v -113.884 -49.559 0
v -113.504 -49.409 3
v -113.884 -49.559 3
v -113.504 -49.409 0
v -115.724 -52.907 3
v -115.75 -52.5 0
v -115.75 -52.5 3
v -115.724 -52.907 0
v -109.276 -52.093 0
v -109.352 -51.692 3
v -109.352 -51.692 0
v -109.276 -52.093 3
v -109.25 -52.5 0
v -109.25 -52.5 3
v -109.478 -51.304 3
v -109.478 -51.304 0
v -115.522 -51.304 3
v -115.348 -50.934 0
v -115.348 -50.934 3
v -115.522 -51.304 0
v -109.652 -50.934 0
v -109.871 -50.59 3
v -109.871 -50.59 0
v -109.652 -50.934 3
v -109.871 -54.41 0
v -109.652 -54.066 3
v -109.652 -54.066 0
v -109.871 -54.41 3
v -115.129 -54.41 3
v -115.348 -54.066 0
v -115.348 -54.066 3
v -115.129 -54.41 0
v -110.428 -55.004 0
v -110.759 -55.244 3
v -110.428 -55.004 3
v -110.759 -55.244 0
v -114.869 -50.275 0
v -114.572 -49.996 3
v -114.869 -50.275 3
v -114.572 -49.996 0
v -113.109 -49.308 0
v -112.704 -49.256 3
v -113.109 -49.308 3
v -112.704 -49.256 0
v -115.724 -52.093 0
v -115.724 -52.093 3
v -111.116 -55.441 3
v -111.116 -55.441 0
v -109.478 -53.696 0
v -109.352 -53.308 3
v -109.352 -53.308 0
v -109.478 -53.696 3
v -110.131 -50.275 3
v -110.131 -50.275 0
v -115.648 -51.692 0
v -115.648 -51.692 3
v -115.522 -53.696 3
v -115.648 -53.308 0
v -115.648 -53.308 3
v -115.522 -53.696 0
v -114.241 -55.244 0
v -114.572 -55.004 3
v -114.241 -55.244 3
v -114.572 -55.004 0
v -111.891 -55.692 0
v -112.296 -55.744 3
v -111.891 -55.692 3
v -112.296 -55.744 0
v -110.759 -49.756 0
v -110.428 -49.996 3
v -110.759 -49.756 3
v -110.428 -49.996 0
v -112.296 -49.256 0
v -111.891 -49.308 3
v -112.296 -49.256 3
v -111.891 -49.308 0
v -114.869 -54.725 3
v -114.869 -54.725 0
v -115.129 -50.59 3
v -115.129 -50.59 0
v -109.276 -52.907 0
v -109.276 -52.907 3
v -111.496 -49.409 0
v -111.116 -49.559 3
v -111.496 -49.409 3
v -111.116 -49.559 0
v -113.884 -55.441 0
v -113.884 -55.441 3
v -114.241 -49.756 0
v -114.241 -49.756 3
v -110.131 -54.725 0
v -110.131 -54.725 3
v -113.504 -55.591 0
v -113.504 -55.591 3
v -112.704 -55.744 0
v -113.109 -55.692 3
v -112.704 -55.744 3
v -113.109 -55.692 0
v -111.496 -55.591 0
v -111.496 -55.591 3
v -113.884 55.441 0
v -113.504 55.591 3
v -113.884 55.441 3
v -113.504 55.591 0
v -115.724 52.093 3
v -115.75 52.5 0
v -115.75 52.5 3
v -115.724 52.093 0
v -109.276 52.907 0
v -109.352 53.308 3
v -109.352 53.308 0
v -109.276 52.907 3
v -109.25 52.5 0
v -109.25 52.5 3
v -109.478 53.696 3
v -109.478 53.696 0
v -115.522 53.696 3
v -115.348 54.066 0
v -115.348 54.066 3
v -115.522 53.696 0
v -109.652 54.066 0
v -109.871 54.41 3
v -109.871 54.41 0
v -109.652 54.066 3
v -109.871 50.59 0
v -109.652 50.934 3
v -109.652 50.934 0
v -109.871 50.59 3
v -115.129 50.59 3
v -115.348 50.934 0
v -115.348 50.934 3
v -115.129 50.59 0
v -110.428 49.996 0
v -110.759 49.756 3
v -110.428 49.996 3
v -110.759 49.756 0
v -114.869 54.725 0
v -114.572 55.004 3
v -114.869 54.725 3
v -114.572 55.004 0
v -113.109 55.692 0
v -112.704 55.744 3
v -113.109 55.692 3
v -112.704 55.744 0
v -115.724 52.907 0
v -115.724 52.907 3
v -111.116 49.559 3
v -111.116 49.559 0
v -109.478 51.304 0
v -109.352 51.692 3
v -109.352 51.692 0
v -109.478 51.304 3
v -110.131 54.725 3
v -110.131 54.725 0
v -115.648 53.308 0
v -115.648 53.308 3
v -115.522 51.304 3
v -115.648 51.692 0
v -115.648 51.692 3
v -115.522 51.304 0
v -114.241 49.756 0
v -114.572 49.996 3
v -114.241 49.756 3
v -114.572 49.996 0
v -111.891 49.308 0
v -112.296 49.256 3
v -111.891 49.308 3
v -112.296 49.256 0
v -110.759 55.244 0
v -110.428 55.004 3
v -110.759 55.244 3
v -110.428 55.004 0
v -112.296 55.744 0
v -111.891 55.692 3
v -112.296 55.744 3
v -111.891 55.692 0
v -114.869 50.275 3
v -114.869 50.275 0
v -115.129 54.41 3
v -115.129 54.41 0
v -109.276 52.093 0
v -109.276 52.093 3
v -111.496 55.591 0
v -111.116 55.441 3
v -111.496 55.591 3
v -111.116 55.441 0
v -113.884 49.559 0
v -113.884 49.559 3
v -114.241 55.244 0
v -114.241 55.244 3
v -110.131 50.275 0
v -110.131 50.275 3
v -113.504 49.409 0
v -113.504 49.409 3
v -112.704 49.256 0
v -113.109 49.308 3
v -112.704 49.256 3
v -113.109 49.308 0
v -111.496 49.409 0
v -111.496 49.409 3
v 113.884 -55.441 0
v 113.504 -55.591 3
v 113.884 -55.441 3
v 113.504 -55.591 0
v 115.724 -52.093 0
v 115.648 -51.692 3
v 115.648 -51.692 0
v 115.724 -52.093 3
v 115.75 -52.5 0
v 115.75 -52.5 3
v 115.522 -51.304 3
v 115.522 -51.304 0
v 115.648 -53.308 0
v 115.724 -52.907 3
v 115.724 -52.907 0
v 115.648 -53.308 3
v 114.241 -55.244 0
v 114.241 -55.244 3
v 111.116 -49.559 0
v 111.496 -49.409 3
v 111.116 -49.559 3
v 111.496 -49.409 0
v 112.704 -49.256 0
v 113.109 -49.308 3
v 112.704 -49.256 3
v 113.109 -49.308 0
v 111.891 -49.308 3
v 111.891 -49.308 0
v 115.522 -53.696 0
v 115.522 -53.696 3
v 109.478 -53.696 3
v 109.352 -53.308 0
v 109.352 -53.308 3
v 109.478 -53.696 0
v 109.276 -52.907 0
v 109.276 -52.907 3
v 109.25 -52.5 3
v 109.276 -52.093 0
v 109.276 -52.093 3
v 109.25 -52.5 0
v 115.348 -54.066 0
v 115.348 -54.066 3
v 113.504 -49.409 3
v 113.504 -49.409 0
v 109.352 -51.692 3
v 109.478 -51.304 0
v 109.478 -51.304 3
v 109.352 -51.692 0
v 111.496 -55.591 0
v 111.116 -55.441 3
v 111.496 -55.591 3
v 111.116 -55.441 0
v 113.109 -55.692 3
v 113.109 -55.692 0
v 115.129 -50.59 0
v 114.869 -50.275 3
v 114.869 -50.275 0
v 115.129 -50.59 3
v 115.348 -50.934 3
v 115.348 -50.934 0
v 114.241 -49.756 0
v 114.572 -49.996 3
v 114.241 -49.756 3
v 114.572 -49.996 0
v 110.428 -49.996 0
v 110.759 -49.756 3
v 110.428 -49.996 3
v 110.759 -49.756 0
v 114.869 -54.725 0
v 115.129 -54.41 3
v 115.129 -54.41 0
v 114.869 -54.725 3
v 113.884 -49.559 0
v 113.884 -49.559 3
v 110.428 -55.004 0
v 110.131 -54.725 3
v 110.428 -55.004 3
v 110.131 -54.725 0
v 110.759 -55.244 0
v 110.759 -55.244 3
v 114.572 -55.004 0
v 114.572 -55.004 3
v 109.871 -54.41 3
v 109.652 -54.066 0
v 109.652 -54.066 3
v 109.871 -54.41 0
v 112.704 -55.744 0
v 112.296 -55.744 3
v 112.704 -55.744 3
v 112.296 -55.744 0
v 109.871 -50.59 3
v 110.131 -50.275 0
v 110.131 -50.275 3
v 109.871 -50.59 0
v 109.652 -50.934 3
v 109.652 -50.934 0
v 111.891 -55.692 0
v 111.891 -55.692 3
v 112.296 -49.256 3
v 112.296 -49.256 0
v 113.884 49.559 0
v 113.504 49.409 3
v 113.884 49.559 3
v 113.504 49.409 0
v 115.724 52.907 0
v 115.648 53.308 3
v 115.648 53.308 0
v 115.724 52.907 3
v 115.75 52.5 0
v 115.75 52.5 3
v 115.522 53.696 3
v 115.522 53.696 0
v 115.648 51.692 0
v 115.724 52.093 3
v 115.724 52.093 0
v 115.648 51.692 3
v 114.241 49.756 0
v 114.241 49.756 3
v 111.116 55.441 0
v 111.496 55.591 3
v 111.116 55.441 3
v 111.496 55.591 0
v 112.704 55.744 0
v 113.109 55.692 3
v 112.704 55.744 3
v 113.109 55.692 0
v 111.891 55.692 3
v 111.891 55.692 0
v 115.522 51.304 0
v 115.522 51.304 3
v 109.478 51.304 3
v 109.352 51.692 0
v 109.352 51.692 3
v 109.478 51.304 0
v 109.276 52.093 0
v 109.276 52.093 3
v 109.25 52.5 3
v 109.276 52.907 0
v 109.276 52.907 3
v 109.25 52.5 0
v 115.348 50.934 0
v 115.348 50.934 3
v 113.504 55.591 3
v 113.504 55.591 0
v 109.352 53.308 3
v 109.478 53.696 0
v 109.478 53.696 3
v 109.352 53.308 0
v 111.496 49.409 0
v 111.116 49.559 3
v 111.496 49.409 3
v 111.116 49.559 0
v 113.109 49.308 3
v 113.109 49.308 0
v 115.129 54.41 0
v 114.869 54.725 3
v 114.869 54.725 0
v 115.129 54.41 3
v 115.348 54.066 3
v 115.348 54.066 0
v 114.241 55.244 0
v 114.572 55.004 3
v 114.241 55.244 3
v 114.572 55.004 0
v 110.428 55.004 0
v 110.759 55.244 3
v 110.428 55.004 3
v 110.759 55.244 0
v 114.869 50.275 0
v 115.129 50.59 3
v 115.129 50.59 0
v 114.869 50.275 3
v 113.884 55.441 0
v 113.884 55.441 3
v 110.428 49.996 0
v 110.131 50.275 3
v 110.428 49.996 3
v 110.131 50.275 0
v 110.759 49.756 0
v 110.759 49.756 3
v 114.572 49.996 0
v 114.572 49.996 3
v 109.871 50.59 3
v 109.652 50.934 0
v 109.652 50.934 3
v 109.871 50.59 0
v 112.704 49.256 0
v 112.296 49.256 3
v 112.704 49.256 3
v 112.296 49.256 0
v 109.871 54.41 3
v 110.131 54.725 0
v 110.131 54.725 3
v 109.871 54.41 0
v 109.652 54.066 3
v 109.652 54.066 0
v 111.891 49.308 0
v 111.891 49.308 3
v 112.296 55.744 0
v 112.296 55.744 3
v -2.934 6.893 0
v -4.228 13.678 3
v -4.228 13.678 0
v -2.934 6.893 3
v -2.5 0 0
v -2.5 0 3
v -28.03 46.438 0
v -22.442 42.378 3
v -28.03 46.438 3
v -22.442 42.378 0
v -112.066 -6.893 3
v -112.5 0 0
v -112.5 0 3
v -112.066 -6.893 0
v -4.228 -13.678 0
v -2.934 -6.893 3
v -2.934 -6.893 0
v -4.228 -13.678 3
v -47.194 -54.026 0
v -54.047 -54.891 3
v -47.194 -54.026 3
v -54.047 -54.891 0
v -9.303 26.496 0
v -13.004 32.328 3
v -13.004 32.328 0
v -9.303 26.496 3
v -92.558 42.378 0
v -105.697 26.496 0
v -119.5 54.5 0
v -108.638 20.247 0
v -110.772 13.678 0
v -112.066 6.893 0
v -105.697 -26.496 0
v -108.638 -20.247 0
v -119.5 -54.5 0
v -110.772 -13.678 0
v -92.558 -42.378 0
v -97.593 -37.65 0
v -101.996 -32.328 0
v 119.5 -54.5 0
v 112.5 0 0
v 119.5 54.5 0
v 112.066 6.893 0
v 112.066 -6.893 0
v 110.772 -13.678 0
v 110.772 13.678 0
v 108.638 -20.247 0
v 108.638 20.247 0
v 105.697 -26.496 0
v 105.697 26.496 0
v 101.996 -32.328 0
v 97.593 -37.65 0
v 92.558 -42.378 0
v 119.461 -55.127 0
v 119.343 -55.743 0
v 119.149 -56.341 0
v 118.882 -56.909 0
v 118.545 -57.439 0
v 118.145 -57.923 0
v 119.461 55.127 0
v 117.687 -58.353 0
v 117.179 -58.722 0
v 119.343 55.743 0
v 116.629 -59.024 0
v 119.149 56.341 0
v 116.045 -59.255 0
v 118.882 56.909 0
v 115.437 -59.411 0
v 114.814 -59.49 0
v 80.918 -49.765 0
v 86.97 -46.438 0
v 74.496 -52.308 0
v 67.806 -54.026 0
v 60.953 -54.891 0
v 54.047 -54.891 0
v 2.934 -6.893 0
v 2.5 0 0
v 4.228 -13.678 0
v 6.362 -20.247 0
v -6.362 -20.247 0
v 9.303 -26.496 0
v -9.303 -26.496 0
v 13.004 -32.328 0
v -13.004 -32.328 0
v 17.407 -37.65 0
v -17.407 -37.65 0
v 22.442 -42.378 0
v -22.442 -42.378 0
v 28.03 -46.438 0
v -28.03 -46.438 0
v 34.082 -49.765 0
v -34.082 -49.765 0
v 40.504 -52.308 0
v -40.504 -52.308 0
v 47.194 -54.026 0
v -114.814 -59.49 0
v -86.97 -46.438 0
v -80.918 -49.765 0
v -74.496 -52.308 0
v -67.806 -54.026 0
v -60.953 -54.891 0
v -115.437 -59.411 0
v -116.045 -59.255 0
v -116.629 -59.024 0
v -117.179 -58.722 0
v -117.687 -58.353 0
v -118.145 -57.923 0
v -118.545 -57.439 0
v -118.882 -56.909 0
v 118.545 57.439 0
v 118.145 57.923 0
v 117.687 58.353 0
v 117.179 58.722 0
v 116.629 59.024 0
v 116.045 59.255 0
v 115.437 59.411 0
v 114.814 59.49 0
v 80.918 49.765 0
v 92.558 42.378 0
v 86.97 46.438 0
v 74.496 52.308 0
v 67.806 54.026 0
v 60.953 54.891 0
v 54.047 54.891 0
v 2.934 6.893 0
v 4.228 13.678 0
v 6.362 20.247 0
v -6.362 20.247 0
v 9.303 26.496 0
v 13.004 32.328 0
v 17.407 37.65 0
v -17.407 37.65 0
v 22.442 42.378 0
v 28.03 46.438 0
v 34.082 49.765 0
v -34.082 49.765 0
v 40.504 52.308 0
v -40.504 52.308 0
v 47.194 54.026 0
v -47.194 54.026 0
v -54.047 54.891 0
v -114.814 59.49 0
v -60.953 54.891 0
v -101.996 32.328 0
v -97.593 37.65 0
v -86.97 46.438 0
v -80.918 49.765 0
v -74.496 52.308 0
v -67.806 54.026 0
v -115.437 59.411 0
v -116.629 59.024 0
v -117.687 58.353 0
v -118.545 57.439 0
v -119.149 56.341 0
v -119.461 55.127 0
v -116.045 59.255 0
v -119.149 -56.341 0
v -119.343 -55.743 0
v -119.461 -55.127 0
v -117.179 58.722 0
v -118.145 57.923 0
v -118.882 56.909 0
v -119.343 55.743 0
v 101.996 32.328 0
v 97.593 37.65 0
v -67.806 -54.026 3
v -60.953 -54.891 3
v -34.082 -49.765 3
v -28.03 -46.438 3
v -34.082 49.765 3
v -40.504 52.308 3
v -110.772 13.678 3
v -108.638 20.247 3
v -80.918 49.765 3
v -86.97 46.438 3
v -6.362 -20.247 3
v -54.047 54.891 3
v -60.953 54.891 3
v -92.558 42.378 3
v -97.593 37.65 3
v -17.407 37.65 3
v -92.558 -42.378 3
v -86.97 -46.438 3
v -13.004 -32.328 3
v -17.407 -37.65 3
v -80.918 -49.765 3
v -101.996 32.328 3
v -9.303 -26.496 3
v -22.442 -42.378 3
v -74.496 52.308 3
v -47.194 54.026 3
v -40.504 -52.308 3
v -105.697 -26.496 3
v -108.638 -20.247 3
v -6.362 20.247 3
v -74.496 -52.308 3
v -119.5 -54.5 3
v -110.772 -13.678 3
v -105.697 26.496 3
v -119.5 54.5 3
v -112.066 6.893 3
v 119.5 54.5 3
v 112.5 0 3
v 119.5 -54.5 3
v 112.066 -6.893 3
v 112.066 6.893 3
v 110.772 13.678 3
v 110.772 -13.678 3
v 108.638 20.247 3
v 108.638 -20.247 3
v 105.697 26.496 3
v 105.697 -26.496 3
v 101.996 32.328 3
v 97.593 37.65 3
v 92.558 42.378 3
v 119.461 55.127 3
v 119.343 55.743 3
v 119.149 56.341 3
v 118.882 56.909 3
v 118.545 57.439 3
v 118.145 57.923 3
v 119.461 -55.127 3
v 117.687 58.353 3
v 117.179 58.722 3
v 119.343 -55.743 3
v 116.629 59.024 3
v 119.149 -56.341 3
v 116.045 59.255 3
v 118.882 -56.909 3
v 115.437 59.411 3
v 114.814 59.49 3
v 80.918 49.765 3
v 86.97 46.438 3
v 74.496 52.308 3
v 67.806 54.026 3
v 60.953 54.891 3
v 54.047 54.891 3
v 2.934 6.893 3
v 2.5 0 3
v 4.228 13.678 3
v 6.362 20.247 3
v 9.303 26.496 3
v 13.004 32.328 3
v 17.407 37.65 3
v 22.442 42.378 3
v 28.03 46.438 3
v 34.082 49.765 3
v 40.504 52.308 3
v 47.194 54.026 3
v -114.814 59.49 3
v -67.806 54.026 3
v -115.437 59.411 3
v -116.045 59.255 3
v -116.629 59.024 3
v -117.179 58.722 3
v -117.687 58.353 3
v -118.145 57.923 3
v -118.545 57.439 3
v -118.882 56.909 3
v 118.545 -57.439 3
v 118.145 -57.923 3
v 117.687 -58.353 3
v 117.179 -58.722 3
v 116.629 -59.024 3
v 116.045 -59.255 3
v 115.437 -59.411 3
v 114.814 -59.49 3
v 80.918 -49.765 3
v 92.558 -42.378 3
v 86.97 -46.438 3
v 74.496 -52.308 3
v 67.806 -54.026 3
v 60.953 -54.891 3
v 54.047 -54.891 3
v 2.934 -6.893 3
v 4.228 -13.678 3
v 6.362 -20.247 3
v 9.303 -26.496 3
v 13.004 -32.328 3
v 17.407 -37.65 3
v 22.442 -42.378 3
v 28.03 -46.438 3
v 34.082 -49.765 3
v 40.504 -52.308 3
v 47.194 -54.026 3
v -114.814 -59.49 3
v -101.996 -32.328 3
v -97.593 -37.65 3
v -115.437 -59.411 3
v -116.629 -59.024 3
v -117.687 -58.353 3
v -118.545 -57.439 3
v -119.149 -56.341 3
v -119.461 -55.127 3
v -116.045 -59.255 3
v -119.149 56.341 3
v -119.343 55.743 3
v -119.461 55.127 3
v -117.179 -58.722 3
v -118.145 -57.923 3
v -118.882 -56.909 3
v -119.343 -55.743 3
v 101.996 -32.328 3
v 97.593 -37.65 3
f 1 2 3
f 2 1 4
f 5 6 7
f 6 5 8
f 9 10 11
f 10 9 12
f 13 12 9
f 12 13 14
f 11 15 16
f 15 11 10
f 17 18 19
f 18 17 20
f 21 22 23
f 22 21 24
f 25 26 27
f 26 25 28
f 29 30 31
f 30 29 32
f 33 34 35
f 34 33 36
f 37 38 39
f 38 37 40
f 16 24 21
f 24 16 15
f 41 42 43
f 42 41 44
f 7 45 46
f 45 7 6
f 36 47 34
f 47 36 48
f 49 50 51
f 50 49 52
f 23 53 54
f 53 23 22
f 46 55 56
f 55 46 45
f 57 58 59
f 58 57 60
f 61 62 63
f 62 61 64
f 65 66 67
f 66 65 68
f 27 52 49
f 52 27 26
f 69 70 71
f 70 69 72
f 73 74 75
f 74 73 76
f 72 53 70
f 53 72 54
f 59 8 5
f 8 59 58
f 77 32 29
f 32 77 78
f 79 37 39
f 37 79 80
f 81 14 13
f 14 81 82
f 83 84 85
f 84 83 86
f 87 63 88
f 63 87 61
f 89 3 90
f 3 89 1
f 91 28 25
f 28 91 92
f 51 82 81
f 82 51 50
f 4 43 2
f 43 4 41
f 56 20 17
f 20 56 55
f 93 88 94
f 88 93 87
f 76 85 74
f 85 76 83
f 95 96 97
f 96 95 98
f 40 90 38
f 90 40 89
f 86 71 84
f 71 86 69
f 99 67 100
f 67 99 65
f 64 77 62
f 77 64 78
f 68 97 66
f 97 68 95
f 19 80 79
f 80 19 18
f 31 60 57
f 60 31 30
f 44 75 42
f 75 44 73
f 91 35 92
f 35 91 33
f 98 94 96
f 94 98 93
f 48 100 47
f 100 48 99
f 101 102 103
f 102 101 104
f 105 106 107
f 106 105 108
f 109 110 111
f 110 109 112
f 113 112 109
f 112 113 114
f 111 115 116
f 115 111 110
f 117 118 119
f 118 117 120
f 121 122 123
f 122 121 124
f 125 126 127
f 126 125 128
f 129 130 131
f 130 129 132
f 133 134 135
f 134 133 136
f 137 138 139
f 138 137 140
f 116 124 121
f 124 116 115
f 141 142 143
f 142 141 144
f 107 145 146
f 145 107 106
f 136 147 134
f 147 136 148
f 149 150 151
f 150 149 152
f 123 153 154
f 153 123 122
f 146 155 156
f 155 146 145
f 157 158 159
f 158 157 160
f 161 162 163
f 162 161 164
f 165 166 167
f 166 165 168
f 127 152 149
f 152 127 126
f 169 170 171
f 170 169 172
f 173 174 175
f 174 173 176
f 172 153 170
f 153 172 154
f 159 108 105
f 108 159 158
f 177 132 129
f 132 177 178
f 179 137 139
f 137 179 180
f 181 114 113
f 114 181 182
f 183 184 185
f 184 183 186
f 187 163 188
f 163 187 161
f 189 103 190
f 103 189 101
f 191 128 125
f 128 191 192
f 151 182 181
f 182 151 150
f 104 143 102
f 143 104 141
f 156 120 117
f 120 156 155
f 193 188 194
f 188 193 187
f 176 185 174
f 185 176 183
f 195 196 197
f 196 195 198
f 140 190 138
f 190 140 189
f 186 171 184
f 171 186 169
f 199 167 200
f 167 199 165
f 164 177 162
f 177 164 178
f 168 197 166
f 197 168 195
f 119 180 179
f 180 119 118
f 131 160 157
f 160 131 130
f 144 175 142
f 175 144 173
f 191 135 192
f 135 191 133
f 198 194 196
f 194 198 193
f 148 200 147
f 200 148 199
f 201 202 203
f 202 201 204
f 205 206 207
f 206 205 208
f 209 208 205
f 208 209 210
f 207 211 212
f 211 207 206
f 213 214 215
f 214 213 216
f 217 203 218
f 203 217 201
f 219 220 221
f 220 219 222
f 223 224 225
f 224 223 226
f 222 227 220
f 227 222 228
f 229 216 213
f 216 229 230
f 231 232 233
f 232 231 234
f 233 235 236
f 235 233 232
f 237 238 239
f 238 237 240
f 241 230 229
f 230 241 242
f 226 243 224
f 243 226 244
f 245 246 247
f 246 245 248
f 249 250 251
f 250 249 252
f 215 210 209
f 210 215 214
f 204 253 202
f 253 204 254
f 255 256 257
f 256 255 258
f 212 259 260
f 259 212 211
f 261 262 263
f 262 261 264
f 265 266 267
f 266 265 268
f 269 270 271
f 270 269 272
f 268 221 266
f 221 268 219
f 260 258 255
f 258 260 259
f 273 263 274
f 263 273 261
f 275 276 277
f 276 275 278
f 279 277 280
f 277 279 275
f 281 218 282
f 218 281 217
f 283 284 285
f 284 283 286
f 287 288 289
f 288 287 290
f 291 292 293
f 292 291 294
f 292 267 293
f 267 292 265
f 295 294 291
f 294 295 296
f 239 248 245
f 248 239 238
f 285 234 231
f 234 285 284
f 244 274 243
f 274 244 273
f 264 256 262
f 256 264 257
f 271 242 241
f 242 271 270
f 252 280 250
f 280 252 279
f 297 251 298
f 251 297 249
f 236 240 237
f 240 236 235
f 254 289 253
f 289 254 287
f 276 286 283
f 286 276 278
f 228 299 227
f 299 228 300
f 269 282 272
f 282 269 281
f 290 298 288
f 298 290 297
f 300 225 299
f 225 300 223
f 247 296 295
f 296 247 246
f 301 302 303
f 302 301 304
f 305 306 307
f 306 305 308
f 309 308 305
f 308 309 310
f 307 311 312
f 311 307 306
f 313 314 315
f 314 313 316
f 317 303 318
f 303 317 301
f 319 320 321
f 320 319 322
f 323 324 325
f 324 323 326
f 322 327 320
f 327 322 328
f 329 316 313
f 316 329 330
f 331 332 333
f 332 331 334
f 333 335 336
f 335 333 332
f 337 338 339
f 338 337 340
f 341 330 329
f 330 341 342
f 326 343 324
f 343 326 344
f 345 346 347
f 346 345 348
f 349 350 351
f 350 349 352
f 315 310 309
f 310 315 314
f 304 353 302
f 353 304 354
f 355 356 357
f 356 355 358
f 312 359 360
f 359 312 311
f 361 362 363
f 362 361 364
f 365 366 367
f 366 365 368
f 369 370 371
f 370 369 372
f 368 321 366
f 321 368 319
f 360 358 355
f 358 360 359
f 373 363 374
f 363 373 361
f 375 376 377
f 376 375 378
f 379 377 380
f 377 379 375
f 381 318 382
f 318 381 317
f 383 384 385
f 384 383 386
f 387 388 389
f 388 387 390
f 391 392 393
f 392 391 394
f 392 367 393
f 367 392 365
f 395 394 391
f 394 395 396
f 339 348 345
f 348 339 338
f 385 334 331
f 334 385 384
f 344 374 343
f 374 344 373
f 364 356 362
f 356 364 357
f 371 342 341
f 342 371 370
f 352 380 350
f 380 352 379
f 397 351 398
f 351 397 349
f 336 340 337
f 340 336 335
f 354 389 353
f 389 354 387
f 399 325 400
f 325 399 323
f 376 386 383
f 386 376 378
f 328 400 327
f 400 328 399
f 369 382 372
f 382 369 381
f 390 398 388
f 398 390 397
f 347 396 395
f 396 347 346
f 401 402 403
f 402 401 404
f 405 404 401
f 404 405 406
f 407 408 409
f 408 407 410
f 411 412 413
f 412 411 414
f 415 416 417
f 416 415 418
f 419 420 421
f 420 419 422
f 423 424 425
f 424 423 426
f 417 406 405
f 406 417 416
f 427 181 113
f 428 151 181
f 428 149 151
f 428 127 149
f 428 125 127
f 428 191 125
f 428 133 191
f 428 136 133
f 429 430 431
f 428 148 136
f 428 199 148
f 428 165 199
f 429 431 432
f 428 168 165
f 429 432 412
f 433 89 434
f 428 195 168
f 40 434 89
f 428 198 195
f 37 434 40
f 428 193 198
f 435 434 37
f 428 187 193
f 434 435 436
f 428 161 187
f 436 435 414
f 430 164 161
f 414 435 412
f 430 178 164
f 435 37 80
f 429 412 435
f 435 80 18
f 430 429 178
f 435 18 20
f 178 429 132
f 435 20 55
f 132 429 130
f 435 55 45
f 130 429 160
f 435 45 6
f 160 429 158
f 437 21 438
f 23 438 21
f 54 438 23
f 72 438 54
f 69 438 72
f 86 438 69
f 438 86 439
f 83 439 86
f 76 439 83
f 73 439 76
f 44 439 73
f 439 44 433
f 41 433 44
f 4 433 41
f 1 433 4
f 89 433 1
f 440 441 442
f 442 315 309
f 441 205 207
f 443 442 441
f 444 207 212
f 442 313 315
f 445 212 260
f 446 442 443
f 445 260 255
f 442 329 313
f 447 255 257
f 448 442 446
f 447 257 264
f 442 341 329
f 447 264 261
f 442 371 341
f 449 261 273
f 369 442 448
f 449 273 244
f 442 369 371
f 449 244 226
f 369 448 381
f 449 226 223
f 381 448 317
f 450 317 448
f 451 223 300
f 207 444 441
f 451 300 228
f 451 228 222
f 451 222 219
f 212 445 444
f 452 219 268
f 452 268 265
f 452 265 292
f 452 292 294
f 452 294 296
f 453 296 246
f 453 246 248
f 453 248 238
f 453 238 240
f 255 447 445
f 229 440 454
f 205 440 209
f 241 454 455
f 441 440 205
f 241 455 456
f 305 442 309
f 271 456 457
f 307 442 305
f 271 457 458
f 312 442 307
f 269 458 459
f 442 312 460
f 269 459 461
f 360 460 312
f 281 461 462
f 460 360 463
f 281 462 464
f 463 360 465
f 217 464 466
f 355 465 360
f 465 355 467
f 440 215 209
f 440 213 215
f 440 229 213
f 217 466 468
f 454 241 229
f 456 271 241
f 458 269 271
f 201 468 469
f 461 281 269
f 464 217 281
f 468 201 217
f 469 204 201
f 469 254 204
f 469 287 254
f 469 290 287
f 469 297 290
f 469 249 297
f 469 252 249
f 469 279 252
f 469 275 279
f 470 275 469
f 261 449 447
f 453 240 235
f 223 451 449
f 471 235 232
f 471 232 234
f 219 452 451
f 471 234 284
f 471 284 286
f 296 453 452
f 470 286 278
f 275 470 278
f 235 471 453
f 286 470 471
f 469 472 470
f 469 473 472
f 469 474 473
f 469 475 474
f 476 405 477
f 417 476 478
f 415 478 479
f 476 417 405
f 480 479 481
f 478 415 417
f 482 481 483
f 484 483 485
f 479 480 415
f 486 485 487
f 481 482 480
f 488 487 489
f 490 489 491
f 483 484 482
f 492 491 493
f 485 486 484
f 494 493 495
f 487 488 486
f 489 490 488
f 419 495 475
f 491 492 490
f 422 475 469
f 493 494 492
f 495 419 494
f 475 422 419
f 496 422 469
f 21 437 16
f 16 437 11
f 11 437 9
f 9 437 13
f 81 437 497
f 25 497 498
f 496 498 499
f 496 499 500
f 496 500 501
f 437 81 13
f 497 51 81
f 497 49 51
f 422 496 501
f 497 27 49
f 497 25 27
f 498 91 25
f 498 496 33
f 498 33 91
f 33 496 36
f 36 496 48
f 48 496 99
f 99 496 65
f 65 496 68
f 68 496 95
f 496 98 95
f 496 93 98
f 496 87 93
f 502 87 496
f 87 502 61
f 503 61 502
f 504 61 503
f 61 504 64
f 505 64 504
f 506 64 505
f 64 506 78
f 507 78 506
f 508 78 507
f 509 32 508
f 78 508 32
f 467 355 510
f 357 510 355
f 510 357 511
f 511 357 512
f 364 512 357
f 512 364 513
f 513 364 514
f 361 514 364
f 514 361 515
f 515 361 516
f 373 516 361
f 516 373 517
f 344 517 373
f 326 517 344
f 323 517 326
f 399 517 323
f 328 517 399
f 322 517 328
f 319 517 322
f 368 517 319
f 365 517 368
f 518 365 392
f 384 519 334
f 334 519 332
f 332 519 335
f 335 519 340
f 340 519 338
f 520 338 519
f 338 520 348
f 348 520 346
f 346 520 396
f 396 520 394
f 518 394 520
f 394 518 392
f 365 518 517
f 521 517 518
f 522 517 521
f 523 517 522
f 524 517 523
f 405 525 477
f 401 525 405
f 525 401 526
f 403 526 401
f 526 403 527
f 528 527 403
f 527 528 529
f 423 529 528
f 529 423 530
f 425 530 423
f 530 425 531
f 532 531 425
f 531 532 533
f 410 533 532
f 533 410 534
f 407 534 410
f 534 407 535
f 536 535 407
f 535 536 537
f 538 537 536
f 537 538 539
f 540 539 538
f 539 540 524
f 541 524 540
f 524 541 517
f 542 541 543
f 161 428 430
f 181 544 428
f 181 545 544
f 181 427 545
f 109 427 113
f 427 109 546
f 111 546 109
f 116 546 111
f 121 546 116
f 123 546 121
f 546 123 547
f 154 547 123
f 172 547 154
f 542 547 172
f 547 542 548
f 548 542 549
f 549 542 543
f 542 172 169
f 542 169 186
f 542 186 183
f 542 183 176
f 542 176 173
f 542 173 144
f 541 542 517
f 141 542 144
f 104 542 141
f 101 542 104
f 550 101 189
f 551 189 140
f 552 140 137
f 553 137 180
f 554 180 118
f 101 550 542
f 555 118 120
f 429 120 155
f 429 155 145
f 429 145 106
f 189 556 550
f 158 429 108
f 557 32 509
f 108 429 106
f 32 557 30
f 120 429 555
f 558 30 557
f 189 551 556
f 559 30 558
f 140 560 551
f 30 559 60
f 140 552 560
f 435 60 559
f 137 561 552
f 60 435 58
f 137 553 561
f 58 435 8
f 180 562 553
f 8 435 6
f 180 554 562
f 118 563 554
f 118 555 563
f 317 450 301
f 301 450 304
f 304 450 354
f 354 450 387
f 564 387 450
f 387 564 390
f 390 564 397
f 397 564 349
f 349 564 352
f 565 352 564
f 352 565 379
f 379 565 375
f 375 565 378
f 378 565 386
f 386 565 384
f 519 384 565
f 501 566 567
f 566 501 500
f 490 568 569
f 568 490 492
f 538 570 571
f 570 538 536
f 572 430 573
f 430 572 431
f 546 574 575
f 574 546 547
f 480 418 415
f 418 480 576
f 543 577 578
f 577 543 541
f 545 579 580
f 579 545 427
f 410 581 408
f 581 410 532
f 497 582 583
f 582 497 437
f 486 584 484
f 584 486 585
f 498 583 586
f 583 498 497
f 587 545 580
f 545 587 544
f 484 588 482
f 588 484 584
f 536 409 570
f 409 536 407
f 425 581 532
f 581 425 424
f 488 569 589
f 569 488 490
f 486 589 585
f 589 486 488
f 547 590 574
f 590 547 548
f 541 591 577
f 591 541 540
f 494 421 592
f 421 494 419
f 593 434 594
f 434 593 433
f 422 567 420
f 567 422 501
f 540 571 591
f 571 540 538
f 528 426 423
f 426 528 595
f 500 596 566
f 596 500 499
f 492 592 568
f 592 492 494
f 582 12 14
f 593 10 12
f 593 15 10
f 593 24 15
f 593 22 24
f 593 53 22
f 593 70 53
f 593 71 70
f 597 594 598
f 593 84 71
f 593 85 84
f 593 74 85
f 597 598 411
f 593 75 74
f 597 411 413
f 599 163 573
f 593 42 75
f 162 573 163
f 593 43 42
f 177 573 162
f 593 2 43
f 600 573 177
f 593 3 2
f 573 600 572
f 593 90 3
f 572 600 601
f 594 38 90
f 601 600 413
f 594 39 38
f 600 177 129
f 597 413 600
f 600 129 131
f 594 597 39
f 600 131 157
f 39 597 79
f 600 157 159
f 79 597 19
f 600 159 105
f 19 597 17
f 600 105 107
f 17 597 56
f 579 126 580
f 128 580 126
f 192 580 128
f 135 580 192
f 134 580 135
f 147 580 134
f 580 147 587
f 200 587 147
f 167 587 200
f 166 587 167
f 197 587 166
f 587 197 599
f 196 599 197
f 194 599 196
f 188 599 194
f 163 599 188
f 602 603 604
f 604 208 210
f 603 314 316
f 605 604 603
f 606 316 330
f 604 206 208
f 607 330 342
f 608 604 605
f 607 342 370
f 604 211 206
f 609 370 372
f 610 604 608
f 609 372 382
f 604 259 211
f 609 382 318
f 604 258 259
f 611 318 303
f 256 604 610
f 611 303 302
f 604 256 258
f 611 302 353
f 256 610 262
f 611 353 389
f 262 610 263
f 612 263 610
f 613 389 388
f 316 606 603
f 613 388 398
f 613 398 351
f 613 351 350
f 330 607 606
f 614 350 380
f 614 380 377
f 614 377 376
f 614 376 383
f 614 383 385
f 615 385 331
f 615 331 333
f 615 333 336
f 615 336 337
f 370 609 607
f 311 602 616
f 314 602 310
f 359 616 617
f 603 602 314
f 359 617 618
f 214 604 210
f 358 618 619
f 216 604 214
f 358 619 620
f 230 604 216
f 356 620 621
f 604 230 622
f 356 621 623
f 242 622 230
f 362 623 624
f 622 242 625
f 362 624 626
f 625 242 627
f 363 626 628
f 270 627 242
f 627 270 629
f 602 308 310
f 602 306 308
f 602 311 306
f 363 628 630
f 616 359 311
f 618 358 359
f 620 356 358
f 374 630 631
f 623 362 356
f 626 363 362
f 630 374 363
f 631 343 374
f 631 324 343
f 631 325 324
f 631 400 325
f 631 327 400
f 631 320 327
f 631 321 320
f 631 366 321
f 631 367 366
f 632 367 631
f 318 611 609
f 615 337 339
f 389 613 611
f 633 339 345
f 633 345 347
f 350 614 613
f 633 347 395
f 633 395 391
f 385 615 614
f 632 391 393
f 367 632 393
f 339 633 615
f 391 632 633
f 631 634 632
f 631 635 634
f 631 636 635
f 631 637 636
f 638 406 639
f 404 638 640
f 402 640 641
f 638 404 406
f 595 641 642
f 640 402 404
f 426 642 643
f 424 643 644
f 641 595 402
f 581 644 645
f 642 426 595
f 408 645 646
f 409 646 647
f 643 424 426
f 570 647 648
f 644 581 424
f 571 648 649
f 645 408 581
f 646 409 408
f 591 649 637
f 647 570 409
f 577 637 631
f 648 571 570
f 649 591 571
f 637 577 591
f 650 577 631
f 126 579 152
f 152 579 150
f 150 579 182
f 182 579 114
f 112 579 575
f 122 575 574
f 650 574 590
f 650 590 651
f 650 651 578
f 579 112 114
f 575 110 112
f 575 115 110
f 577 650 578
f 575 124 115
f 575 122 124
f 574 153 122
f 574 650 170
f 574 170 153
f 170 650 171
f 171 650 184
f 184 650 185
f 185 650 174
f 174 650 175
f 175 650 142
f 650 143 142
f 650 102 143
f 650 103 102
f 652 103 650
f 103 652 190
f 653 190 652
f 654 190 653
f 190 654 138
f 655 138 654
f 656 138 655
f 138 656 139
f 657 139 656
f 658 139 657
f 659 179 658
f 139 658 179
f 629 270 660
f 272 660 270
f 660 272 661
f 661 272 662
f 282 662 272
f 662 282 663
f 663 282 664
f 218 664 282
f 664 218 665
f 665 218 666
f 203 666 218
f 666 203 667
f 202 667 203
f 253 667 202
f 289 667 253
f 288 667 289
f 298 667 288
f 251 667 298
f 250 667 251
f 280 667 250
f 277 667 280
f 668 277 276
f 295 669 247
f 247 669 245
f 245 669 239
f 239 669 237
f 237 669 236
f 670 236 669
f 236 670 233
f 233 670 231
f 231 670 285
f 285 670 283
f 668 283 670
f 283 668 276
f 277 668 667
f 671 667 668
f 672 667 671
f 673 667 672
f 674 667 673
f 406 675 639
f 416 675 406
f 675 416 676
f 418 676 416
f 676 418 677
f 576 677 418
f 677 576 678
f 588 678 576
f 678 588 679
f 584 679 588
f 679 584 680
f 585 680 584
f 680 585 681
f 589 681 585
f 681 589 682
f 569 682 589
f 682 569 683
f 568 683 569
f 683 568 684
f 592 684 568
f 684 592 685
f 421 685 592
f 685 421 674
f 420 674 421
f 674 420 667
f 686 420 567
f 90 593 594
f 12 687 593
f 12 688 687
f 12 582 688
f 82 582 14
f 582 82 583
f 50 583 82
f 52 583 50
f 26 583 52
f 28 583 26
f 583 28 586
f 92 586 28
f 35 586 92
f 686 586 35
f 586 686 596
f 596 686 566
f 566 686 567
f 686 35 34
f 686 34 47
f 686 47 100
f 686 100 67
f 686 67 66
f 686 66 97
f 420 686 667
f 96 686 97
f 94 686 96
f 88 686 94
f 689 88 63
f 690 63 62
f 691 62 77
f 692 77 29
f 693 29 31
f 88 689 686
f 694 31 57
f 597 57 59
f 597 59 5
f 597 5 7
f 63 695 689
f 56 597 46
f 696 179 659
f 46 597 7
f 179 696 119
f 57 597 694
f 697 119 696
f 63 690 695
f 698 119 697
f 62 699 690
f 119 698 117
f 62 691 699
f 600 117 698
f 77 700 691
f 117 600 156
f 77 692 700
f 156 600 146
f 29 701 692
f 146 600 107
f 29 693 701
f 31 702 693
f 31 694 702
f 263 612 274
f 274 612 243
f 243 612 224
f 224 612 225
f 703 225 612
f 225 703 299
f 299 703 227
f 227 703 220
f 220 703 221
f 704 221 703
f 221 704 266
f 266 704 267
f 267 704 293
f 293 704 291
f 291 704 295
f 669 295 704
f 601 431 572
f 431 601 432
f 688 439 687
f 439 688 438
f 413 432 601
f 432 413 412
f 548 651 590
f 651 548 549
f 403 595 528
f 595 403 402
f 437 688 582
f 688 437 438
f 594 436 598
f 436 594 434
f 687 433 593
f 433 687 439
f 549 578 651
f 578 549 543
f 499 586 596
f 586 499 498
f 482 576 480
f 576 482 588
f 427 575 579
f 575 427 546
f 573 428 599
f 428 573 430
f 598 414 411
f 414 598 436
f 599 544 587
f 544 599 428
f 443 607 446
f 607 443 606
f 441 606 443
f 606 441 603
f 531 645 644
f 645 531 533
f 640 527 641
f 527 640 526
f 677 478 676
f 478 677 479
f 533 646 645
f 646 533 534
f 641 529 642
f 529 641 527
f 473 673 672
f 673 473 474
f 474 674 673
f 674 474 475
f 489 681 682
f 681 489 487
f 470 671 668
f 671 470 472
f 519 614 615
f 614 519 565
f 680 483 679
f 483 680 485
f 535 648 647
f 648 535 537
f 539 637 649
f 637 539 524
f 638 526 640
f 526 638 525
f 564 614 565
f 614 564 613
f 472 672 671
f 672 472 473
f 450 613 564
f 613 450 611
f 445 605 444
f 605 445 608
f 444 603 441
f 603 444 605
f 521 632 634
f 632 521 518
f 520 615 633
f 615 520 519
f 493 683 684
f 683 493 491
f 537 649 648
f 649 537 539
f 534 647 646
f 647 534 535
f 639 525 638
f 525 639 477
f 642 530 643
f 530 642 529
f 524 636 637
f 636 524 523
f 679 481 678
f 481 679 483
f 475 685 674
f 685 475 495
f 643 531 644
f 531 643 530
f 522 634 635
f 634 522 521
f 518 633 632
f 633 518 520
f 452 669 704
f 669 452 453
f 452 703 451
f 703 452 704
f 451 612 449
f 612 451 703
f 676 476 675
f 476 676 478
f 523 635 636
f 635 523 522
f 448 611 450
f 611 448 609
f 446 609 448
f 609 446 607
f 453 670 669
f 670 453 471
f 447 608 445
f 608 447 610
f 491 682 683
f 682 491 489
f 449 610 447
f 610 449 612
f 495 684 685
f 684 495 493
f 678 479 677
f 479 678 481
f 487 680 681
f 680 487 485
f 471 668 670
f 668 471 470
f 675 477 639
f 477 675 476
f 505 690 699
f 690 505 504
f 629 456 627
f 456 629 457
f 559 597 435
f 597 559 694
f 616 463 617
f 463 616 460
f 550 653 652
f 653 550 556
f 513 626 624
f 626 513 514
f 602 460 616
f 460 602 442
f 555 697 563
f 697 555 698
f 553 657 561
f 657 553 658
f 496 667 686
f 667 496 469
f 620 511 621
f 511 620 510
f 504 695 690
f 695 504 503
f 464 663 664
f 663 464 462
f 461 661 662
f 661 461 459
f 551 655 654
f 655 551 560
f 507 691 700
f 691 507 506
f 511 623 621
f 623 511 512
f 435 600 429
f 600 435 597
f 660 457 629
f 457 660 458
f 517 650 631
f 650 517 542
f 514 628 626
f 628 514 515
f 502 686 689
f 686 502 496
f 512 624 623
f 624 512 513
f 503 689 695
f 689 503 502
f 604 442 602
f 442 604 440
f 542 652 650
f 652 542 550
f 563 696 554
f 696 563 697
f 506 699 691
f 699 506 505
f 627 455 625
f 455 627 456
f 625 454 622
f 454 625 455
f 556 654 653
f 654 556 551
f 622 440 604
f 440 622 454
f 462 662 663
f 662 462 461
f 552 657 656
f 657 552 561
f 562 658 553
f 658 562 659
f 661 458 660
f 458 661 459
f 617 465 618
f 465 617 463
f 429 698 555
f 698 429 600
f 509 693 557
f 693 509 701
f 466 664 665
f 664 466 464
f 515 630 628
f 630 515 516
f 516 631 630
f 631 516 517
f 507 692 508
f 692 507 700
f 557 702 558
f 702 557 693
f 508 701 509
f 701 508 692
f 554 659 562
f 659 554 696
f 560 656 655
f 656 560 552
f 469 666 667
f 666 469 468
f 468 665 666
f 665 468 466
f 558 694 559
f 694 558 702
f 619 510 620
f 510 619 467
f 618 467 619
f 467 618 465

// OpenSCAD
$fn = 50;

difference() {
	union() {
		hull() {
			translate(v = [-114.5, 54.5, 0]) {
				cylinder(h = 3, r = 5);
			}
			translate(v = [114.5, 54.5, 0]) {
				cylinder(h = 3, r = 5);
			}
			translate(v = [-114.5, -54.5, 0]) {
				cylinder(h = 3, r = 5);
			}
			translate(v = [114.5, -54.5, 0]) {
				cylinder(h = 3, r = 5);
			}
		}
	}
	union() {
		translate(v = [-112.5, -52.5, -100.0]) {
			cylinder(h = 200, r = 3.25);
		}
		translate(v = [-112.5, 52.5, -100.0]) {
			cylinder(h = 200, r = 3.25);
		}
		translate(v = [112.5, -52.5, -100.0]) {
			cylinder(h = 200, r = 3.25);
		}
		translate(v = [112.5, 52.5, -100.0]) {
			cylinder(h = 200, r = 3.25);
		}
		translate(v = [-112.5, -52.5, -100.0]) {
			cylinder(h = 200, r = 1.8);
		}
		translate(v = [-112.5, 52.5, -100.0]) {
			cylinder(h = 200, r = 1.8);
		}
		translate(v = [112.5, -52.5, -100.0]) {
			cylinder(h = 200, r = 1.8);
		}
		translate(v = [112.5, 52.5, -100.0]) {
			cylinder(h = 200, r = 1.8);
		}
		translate(v = [-57.5, 0, 0.0]) {
			cylinder(h = 3, r = 55.0);
		}
		translate(v = [57.5, 0, 0.0]) {
			cylinder(h = 3, r = 55.0);
		}
	}
}
